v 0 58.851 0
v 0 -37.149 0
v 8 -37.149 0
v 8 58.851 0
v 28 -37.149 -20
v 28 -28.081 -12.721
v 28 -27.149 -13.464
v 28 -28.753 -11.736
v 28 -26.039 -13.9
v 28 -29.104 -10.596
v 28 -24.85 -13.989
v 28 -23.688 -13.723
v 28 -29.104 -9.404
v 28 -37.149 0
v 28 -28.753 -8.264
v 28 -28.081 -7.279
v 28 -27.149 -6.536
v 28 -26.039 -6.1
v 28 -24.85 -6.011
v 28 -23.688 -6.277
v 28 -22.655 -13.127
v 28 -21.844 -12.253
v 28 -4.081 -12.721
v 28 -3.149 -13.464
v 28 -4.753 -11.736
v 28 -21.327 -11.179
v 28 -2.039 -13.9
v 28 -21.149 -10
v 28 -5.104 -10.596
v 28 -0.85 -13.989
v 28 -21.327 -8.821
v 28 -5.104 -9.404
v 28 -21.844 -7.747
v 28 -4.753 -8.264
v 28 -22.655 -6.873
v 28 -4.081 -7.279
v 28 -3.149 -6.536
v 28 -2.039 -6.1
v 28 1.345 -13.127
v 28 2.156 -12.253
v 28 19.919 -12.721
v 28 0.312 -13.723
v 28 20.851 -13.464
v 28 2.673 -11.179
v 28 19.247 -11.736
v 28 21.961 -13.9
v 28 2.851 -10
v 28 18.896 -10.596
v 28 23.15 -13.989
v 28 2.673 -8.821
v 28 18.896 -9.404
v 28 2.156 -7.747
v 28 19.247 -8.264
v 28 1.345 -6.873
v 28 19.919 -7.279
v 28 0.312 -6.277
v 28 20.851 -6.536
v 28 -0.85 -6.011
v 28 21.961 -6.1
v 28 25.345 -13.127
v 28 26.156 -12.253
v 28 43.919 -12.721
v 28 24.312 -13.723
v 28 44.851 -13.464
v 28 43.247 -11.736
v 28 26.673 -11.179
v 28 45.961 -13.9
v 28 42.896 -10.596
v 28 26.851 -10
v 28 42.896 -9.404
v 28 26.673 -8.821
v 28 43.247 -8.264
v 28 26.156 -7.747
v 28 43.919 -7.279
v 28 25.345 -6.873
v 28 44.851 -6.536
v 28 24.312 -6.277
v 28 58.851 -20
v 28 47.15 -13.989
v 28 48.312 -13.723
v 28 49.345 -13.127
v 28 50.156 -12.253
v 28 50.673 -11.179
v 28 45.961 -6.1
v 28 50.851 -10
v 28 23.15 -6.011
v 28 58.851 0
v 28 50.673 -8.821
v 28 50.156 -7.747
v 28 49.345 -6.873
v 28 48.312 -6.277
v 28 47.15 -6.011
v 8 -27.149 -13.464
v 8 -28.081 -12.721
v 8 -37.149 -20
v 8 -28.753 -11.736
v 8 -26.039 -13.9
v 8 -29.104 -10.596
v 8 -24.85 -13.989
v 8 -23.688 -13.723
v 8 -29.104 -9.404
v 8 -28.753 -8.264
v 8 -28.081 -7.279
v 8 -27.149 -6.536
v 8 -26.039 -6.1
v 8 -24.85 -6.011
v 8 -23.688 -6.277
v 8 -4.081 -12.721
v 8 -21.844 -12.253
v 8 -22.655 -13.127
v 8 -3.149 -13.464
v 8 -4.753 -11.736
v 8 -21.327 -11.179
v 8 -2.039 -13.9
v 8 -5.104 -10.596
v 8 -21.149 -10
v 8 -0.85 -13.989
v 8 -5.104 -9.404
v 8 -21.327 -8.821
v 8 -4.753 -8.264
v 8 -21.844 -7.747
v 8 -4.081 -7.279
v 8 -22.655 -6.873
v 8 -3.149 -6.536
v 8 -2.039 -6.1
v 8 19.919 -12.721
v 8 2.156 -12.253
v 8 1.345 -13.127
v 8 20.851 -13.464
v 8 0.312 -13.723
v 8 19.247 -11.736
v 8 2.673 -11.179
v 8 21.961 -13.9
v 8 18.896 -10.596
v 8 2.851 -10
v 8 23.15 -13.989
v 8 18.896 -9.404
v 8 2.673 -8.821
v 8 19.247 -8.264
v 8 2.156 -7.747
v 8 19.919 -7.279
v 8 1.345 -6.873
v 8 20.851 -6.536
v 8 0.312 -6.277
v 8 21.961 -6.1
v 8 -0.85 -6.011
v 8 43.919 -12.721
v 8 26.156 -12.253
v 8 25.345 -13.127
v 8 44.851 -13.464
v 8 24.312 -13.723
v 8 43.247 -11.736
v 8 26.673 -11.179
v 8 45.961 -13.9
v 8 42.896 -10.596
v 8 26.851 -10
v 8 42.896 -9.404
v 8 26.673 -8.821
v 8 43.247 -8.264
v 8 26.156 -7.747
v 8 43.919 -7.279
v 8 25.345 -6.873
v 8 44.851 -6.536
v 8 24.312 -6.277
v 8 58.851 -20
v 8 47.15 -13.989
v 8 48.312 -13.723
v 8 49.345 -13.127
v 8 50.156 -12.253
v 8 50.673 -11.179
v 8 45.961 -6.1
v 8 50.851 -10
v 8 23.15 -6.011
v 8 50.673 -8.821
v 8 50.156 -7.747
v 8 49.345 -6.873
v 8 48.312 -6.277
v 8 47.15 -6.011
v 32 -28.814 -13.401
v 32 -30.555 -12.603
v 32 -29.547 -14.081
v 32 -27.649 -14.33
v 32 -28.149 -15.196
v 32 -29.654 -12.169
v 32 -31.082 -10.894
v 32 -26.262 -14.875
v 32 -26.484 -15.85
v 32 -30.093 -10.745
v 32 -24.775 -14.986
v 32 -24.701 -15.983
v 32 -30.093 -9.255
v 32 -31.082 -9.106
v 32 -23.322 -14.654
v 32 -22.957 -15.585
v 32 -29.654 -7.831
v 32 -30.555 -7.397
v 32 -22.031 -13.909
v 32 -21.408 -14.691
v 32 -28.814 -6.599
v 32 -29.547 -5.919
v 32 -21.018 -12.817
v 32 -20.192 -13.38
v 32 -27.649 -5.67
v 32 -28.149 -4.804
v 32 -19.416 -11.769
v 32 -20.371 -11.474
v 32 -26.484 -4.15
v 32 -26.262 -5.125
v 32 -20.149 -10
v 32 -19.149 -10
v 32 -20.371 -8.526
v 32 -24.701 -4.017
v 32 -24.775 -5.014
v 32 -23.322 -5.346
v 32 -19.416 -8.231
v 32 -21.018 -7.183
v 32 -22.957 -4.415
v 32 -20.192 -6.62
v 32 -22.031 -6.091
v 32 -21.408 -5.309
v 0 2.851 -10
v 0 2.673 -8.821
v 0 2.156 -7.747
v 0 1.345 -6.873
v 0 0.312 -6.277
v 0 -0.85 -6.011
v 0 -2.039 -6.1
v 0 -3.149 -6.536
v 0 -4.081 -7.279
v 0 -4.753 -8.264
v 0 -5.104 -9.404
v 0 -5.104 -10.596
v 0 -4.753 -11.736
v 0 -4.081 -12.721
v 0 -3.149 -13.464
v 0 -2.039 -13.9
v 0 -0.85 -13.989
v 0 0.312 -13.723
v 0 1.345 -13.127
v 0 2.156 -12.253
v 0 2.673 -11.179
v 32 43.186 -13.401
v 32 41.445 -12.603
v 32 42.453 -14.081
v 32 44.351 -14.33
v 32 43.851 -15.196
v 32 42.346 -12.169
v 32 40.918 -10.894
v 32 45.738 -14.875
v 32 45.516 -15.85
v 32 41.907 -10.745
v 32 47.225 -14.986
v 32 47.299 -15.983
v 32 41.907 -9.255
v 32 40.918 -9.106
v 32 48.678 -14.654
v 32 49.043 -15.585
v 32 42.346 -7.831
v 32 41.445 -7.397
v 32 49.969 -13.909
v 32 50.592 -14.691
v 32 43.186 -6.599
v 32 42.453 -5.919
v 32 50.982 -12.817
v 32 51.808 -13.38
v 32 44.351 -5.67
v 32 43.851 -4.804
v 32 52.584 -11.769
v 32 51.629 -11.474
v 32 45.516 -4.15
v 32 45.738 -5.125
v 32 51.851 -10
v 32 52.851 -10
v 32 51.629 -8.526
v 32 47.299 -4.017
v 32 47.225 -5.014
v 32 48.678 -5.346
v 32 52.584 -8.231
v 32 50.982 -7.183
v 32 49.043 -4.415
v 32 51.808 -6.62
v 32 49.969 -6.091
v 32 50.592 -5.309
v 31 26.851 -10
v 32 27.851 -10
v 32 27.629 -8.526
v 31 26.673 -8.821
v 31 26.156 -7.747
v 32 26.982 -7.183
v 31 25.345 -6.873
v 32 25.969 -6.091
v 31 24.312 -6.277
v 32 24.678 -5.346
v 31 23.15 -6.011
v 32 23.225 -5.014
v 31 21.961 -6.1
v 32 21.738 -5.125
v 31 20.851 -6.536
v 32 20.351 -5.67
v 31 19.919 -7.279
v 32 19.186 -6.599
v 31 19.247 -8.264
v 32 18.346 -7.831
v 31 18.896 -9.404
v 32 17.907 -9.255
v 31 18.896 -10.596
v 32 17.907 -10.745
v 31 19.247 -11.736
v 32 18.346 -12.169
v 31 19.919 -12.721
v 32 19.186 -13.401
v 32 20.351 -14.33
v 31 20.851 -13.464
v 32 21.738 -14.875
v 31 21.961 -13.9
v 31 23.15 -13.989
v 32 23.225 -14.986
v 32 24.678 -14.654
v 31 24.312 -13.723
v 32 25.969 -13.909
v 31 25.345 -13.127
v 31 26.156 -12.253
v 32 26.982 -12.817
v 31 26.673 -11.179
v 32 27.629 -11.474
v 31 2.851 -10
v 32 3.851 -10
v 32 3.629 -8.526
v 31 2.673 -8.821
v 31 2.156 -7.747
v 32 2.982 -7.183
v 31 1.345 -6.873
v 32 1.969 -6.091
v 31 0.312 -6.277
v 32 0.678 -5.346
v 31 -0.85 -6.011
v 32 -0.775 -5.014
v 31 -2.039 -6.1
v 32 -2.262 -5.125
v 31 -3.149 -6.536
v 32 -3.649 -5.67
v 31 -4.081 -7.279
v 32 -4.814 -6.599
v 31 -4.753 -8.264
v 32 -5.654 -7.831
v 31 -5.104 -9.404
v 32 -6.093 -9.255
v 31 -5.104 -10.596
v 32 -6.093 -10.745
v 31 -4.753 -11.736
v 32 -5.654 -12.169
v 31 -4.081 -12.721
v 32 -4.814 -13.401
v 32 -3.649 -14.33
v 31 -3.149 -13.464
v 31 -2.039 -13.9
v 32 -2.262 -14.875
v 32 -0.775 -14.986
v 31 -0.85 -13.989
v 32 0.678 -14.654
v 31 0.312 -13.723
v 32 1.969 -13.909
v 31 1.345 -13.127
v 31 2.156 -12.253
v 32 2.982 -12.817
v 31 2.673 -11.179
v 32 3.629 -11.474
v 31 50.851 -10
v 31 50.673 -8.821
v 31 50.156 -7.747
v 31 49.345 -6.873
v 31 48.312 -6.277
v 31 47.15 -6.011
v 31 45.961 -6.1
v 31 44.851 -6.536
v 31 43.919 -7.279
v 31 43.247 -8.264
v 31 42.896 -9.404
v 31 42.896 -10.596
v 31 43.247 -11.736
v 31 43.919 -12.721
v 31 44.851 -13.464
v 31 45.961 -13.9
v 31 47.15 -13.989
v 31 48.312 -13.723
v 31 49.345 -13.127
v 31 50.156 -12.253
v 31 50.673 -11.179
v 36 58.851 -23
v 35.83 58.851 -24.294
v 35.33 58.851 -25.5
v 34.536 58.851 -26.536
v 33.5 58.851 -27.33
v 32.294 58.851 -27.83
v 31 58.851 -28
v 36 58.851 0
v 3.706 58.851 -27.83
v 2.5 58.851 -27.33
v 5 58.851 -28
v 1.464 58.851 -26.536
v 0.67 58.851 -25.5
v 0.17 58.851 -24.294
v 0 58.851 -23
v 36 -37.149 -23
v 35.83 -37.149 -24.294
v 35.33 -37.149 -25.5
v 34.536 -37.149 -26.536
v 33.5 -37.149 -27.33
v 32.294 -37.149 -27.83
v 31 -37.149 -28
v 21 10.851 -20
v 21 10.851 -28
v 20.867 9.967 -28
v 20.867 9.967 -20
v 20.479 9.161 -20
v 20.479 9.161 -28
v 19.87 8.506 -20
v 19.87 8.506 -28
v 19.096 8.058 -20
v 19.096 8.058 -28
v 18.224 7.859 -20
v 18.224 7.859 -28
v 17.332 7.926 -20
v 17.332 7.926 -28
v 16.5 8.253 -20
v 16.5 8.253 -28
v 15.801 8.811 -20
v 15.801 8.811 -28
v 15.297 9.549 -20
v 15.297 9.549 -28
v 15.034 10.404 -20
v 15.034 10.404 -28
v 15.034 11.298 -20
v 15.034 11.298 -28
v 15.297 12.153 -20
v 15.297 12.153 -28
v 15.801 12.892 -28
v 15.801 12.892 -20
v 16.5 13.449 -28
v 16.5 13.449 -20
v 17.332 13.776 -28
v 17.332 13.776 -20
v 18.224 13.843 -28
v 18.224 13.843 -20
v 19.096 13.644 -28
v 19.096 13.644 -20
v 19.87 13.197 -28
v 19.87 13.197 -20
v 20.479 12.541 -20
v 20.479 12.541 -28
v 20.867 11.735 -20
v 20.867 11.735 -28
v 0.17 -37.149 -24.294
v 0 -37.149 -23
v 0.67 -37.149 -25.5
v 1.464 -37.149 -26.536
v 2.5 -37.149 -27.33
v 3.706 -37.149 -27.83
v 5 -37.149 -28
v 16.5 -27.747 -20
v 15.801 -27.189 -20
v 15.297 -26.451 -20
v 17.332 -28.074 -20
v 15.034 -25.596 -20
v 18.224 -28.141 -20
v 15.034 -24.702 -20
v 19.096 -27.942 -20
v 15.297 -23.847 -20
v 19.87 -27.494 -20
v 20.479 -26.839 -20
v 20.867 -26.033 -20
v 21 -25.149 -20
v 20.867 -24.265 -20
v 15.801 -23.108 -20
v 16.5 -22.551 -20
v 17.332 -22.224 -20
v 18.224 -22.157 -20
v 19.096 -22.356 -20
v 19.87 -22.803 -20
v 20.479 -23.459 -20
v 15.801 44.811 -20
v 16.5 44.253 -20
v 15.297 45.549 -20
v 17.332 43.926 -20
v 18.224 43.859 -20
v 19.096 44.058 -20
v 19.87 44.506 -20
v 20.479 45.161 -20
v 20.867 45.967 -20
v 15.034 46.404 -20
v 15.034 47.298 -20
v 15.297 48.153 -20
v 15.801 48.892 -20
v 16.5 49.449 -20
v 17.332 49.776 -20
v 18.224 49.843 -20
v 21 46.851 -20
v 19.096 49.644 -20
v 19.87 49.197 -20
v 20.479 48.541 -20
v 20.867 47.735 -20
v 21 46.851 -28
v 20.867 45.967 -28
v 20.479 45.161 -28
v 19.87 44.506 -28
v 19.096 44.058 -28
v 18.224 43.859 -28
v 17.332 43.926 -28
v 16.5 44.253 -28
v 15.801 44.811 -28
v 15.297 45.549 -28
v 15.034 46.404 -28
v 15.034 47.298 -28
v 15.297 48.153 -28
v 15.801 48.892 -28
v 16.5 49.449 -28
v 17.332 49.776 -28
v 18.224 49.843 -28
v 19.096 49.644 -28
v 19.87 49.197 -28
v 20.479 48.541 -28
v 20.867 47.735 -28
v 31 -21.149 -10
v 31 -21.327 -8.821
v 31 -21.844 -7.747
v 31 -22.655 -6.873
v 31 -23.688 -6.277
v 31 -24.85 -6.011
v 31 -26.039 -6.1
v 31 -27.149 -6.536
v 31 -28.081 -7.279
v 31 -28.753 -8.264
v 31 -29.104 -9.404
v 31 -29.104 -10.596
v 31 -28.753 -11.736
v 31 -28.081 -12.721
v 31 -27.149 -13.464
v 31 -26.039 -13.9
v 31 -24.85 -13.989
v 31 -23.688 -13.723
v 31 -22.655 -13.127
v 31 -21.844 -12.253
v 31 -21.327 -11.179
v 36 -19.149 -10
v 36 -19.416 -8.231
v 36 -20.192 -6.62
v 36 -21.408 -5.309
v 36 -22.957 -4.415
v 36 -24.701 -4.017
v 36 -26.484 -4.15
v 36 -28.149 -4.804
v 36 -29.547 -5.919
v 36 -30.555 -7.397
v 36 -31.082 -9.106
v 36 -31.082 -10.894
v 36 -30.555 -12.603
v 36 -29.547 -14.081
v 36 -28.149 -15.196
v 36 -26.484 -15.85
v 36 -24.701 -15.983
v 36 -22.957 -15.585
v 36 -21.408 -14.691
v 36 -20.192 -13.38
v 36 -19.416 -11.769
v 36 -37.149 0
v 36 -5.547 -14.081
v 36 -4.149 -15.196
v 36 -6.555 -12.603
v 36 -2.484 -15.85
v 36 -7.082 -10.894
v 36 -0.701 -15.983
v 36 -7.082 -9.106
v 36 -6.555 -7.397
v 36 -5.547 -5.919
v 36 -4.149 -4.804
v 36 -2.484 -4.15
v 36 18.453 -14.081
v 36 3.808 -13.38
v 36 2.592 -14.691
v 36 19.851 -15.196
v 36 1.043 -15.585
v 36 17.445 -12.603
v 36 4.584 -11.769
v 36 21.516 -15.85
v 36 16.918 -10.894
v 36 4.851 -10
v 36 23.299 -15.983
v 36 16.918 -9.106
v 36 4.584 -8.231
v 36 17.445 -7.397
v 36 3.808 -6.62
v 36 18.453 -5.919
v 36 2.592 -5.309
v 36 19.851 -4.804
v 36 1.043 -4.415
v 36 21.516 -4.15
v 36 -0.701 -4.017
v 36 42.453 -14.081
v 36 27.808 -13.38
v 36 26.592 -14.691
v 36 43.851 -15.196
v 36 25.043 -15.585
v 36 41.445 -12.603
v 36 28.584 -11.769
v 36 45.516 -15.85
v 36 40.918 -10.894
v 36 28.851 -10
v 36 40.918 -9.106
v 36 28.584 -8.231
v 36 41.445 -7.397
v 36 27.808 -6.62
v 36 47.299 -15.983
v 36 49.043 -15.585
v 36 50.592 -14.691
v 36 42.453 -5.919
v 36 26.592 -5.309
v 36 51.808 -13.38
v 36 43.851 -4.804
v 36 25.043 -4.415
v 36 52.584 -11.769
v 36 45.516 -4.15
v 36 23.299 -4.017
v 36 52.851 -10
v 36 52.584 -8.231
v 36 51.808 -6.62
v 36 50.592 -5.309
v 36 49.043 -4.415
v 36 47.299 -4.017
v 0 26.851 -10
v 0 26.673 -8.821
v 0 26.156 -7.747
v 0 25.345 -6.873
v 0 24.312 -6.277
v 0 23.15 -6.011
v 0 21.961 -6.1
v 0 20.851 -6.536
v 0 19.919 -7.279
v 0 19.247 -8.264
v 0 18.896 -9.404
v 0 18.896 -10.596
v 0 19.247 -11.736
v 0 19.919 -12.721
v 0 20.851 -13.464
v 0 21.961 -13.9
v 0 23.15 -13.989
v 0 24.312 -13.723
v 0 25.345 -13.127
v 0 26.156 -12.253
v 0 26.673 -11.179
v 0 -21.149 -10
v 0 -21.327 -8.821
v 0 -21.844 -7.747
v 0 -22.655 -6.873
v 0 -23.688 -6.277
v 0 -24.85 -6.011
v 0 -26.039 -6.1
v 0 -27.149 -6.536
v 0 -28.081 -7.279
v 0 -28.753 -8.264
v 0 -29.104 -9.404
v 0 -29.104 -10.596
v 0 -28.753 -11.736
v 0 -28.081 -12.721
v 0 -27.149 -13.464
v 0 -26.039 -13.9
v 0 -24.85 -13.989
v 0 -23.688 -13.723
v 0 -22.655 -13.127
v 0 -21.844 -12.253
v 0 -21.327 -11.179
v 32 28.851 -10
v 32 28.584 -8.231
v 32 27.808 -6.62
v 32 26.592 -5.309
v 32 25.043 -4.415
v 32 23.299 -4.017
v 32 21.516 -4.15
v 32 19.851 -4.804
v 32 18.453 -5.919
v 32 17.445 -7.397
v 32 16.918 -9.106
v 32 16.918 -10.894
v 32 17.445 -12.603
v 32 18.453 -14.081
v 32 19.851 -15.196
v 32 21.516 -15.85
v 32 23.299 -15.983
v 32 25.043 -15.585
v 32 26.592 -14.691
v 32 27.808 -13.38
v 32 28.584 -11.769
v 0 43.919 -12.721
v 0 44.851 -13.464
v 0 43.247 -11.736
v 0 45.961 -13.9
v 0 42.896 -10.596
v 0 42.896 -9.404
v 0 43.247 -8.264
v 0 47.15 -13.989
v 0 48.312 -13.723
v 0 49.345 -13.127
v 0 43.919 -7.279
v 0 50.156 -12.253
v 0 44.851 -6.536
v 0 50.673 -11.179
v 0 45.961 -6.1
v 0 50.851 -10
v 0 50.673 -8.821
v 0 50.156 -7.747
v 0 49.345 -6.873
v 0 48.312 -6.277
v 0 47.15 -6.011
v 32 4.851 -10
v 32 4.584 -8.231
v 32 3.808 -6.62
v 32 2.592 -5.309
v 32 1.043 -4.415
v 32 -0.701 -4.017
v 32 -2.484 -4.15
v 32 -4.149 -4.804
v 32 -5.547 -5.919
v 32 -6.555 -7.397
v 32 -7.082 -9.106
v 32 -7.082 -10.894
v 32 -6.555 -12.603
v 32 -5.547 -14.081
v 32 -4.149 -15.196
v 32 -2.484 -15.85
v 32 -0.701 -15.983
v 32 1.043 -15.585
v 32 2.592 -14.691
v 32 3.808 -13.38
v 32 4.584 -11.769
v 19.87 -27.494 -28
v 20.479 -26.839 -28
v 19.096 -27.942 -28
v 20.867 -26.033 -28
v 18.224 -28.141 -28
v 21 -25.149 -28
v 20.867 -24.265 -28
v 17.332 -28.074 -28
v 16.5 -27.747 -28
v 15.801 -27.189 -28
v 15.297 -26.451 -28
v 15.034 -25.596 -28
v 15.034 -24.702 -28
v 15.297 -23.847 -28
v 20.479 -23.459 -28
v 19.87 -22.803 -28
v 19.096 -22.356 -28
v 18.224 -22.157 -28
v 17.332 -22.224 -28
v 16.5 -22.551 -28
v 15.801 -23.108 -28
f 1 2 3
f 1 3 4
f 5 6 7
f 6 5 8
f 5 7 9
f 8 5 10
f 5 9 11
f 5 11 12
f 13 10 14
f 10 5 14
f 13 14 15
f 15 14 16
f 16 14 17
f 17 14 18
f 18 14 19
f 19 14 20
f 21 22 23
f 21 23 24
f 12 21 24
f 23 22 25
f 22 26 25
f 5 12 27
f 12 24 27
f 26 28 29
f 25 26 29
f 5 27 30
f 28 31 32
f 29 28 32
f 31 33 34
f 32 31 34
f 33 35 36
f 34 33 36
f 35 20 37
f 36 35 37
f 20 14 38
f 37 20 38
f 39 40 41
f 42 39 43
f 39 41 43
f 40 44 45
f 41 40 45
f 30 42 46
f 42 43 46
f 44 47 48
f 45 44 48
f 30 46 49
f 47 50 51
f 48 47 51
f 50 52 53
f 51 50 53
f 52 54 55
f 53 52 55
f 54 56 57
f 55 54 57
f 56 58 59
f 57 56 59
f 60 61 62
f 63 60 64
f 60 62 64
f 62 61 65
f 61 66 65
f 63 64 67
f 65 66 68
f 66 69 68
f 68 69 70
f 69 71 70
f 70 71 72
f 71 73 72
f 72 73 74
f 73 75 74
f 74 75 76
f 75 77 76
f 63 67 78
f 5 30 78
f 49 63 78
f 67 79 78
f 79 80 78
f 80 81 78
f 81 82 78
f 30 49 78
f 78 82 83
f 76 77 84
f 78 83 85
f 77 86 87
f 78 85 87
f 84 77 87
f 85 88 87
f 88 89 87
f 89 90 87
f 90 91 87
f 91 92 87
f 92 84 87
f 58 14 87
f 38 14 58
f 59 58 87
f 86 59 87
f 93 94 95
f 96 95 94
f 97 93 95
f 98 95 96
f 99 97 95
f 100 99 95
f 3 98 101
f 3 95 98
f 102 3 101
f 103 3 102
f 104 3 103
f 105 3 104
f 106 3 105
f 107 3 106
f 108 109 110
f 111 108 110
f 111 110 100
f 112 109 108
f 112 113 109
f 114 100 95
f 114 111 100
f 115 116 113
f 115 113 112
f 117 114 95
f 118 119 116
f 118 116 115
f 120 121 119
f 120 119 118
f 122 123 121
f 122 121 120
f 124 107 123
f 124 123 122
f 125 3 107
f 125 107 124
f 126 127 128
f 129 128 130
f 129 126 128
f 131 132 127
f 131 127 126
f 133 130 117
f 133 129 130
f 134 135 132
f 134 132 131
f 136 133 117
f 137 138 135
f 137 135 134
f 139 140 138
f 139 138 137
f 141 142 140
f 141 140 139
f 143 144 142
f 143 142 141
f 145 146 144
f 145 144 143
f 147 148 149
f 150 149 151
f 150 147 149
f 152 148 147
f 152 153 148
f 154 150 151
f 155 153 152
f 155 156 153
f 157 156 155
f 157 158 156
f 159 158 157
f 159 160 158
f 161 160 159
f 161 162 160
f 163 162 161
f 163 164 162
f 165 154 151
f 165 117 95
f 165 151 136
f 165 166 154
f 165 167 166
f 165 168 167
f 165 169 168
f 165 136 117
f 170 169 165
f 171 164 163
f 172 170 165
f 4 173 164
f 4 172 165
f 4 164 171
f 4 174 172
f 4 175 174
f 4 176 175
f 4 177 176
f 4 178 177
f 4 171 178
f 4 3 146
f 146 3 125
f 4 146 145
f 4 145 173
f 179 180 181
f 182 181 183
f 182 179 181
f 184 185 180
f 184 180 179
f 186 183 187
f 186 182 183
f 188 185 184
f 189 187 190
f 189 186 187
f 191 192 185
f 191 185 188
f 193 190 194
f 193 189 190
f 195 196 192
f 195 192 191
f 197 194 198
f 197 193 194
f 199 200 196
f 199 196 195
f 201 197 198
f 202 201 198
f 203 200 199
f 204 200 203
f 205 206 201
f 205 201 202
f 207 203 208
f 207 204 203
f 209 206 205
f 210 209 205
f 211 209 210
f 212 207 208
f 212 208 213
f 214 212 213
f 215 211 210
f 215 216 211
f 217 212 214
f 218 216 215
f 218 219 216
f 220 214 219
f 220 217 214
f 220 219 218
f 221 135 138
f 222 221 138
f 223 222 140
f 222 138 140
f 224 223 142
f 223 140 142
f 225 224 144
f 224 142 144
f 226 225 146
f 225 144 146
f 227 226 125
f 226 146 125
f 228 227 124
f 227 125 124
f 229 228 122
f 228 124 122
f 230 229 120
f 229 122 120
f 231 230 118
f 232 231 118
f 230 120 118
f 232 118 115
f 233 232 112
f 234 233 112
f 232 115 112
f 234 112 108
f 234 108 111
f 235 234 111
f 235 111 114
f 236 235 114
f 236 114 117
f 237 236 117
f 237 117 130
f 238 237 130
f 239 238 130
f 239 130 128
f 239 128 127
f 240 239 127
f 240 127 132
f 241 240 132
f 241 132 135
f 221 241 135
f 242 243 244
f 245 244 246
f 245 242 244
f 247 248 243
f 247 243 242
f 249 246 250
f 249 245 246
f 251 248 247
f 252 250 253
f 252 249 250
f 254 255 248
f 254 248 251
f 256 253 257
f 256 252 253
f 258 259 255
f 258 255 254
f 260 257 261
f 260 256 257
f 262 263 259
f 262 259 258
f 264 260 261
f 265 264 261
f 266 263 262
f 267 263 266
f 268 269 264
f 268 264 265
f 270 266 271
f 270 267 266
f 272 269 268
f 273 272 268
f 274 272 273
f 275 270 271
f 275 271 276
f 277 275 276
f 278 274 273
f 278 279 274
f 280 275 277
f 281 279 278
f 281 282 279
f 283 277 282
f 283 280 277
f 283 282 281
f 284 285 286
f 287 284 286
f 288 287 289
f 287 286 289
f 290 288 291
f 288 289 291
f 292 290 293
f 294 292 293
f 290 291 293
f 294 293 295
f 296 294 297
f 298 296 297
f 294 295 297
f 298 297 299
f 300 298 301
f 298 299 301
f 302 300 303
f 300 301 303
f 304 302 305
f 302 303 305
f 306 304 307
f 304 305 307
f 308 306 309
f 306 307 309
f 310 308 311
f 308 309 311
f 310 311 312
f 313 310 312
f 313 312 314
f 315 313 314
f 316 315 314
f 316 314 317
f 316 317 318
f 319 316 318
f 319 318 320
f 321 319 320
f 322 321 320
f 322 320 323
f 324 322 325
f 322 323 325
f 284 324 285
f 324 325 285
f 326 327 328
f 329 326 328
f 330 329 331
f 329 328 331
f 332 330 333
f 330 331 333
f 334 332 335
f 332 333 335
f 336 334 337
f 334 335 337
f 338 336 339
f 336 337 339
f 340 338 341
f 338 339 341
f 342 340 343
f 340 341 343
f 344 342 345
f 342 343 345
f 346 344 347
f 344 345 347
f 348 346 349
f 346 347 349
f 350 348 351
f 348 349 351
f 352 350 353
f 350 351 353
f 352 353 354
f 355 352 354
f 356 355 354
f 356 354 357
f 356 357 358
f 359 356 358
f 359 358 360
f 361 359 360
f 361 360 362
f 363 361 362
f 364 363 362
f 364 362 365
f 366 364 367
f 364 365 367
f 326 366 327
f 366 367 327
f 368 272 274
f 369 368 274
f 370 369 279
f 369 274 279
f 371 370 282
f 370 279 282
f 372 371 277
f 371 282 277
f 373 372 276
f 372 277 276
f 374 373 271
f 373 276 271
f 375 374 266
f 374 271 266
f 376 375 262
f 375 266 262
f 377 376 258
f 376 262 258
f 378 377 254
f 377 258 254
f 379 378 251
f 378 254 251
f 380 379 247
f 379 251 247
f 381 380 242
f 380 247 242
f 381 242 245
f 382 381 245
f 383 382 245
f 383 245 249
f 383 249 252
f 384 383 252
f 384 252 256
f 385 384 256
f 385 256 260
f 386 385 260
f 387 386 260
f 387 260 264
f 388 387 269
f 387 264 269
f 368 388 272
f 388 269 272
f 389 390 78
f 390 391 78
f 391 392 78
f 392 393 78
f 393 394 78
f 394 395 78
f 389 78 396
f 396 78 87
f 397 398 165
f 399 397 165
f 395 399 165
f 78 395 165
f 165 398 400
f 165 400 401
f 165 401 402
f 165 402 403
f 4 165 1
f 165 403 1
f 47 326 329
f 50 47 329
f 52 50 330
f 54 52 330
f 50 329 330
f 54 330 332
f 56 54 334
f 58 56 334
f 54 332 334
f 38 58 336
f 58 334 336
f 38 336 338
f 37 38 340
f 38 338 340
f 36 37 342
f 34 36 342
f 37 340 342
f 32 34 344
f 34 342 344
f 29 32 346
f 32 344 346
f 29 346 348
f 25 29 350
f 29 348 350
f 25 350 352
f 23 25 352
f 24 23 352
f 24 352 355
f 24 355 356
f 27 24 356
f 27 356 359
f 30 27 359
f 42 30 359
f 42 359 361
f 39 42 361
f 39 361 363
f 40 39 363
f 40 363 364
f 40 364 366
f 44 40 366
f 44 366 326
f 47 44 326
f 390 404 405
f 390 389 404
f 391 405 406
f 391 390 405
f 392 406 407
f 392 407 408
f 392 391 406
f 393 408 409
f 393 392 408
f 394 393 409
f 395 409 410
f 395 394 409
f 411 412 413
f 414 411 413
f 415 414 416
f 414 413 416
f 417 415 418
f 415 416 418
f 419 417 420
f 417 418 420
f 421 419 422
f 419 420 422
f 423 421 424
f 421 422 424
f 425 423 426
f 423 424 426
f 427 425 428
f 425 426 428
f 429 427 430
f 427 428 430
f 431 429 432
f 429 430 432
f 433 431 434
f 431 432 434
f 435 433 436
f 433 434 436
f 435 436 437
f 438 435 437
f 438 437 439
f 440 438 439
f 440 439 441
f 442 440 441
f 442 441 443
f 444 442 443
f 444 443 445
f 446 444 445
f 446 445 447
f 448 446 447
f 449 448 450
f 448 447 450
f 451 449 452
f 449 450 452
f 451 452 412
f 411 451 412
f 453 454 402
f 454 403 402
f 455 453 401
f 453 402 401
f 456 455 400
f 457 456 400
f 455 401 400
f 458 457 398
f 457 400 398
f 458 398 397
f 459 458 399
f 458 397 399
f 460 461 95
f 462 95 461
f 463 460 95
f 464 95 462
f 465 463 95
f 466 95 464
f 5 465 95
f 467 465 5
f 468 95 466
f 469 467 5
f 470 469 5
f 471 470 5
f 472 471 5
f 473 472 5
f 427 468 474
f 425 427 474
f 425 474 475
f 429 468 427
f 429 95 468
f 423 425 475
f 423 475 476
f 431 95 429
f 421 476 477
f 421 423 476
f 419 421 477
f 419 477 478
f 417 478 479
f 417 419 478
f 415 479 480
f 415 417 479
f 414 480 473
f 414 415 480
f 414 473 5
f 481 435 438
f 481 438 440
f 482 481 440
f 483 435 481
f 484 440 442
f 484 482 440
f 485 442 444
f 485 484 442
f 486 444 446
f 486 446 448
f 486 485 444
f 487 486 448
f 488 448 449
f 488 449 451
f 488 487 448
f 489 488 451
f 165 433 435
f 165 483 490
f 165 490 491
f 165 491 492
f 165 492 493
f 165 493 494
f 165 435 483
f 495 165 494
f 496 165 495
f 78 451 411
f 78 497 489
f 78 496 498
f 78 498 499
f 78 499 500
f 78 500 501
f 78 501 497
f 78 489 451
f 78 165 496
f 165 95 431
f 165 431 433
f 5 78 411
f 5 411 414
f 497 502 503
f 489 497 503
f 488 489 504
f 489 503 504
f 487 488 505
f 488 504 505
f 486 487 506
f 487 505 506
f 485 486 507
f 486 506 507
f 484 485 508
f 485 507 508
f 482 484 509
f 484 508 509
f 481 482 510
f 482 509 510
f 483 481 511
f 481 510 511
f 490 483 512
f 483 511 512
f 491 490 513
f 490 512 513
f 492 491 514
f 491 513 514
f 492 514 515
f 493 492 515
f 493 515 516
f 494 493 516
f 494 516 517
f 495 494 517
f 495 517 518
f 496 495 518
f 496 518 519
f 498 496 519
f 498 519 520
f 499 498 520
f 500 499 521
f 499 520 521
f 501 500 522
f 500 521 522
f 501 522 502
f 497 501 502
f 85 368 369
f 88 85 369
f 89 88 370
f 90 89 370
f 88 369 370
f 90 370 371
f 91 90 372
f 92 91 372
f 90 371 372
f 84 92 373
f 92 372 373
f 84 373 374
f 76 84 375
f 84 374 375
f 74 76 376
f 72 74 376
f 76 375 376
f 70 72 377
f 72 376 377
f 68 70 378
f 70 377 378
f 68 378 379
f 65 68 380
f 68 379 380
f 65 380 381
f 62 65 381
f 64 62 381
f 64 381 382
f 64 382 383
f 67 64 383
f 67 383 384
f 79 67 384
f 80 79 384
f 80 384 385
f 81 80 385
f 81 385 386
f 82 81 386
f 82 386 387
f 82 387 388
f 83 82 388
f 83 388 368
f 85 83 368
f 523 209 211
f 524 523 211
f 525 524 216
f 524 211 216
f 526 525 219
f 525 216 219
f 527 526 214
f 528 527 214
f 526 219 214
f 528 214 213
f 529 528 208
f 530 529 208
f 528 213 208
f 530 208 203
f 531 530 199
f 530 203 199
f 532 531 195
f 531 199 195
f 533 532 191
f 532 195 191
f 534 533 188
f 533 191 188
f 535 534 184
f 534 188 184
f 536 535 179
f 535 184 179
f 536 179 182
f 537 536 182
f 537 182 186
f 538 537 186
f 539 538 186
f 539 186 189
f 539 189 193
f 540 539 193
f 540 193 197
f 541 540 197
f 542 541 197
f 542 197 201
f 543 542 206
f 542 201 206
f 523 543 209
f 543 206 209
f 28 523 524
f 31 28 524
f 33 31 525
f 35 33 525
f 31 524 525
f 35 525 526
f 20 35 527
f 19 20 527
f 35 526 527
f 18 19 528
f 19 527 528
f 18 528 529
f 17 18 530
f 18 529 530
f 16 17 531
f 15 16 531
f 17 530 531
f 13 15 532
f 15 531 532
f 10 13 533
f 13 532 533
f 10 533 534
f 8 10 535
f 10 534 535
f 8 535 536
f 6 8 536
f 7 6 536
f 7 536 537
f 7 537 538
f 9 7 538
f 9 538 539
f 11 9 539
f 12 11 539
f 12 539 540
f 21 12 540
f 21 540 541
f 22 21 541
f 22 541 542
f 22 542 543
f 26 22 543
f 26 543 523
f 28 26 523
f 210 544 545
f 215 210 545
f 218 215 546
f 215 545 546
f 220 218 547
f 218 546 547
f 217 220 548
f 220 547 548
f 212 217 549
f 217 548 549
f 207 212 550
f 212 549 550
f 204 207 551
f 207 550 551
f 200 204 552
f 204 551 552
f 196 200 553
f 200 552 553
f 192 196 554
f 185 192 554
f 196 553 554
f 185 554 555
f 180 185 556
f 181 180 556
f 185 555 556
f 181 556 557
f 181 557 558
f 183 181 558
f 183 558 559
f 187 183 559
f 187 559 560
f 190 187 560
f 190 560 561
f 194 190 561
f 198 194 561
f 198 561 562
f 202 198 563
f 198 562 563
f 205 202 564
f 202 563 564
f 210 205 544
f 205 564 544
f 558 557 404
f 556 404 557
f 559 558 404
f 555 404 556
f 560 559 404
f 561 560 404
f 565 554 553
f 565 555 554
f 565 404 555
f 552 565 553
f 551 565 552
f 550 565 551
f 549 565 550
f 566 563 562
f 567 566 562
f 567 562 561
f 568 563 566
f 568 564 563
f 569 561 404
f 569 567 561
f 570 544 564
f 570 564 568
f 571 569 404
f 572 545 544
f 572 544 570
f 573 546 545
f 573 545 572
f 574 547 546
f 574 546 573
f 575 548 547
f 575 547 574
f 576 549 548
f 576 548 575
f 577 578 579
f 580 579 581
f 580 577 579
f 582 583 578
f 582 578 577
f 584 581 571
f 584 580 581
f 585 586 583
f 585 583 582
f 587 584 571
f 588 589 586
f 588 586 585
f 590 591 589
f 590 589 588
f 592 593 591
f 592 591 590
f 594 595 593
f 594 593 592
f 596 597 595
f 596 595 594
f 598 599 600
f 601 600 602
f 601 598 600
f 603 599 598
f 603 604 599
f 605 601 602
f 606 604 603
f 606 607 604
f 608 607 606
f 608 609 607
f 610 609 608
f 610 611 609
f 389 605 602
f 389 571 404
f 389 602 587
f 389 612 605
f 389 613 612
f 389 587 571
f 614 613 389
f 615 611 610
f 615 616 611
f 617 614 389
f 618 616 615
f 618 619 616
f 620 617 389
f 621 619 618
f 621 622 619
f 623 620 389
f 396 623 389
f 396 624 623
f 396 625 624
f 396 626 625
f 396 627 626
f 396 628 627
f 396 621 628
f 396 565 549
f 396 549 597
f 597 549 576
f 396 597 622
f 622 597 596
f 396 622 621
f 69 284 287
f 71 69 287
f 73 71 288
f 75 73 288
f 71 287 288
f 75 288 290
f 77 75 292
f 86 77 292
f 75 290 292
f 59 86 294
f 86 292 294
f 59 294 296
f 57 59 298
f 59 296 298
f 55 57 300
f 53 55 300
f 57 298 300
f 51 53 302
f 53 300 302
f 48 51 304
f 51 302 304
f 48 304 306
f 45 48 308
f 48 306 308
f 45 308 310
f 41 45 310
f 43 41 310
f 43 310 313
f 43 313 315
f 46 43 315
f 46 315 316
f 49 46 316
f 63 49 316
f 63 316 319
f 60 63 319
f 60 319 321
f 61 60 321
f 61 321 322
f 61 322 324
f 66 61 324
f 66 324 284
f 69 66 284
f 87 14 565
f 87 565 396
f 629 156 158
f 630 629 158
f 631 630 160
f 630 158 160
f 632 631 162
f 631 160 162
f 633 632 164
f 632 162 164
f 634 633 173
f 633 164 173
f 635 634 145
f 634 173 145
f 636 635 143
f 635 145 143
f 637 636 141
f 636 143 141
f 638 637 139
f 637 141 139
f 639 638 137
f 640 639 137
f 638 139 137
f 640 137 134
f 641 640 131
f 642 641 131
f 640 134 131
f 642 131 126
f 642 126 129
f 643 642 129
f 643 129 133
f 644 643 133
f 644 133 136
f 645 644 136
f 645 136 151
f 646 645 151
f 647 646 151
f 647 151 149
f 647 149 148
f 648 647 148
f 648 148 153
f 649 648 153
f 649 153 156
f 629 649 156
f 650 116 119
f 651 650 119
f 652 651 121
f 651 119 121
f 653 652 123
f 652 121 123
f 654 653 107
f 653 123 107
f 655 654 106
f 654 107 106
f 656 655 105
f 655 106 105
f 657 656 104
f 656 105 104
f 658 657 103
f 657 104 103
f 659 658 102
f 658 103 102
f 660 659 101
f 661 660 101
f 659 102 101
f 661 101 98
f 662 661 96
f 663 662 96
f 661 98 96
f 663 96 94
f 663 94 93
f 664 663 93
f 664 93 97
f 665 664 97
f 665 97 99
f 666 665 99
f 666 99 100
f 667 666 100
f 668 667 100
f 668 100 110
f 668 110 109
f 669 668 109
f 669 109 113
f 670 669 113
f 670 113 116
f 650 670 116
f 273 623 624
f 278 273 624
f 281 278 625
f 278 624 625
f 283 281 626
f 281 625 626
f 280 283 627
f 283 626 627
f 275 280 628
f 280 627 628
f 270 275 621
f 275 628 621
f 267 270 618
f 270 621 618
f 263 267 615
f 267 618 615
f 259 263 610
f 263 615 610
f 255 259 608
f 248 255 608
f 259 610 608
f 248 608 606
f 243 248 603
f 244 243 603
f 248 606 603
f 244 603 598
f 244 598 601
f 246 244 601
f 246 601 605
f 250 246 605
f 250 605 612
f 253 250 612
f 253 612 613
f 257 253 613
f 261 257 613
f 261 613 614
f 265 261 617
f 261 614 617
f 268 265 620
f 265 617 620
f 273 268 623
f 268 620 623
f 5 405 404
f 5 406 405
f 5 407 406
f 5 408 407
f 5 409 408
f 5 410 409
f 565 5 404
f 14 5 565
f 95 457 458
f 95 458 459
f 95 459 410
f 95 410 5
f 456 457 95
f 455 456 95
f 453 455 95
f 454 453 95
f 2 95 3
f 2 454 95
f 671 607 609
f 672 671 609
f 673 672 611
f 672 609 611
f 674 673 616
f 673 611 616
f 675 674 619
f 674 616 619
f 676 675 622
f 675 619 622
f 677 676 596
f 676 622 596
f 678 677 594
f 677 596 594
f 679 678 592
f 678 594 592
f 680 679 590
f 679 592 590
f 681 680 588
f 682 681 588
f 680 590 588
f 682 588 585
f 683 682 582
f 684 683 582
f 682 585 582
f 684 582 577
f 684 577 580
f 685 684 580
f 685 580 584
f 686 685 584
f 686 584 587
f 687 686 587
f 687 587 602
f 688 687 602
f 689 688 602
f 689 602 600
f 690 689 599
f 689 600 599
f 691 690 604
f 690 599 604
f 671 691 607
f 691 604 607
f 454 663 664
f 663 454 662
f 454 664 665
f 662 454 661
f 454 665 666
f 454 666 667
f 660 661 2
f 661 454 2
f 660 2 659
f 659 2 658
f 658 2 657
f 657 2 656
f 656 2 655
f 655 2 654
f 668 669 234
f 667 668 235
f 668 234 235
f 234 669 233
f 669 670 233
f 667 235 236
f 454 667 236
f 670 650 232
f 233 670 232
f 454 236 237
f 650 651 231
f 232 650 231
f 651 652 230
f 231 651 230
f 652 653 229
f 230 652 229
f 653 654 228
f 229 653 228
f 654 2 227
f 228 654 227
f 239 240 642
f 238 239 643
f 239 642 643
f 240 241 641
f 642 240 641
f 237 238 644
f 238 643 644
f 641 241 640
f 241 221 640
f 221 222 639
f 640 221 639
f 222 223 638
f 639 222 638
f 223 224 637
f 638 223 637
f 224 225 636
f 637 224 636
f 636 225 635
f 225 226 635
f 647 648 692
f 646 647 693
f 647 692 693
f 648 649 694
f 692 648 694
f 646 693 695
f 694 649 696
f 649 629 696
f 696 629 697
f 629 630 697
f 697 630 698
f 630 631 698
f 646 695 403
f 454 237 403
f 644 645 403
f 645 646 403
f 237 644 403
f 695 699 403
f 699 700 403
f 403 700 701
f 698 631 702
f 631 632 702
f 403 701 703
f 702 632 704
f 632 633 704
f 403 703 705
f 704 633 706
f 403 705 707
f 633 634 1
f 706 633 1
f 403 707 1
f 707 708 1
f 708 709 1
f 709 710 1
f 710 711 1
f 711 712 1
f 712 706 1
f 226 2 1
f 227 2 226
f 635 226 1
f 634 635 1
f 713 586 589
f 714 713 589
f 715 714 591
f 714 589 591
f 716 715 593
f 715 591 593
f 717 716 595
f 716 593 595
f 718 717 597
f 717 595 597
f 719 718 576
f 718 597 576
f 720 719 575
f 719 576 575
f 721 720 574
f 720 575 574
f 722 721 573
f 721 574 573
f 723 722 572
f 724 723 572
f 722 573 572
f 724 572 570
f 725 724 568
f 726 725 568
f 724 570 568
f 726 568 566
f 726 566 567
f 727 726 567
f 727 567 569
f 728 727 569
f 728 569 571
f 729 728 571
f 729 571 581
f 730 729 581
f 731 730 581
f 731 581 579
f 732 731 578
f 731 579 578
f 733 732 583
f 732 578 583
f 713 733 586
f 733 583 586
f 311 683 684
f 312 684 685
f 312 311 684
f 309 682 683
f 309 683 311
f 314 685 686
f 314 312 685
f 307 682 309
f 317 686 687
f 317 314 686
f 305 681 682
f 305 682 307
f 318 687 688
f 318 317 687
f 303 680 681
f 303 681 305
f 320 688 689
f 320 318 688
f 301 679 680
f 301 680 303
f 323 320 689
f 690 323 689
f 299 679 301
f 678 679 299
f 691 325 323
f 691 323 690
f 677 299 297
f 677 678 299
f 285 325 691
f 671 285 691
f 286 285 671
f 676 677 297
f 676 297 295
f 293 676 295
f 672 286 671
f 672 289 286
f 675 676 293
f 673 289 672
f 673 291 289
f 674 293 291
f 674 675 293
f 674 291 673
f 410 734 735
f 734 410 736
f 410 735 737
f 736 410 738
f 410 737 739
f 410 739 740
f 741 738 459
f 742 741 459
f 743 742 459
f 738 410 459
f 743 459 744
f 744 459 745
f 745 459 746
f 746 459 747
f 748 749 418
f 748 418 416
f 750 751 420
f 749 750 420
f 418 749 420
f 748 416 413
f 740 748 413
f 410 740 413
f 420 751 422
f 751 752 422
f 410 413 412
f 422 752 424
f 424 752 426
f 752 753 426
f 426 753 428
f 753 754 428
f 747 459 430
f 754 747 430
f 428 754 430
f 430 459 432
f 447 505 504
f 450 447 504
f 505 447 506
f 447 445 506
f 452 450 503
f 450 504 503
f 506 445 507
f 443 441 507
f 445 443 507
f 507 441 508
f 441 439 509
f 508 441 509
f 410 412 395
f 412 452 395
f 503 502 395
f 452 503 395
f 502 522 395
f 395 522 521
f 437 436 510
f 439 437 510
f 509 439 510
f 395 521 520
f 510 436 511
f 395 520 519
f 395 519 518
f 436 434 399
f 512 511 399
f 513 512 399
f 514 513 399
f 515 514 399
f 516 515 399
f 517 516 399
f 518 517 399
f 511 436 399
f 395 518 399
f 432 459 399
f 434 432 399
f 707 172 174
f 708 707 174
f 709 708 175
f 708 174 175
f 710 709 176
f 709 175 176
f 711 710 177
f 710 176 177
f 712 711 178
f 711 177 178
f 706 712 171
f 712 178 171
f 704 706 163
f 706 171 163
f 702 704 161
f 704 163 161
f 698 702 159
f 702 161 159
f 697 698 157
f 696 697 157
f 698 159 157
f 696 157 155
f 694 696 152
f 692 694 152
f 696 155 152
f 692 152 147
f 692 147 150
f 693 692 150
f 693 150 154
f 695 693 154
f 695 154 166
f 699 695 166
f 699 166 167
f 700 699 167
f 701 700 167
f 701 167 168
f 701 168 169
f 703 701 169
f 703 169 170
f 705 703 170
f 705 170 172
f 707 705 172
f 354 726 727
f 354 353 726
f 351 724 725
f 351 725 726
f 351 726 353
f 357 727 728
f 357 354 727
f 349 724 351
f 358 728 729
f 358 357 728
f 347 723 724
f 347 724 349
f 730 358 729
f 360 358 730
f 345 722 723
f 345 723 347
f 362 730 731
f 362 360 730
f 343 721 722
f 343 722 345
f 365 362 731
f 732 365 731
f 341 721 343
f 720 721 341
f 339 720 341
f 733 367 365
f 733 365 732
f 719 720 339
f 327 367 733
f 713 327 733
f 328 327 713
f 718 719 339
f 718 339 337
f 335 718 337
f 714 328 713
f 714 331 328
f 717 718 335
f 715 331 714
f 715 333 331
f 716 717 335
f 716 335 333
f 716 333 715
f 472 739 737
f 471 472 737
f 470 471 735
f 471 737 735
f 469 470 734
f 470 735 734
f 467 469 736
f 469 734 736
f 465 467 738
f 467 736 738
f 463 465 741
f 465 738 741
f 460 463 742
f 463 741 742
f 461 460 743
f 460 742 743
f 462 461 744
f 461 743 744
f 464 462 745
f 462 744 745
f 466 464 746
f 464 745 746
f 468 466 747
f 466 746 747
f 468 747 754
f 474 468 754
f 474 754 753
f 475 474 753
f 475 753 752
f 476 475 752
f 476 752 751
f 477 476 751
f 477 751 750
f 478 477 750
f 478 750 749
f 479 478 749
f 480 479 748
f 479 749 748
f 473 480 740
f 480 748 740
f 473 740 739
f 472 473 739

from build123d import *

# Parameters (mm, degrees)
F0_W      = 96
F0_H      = 28
F1_DEPTH  = 36
F2_W      = 20
F2_H      = 96
F3_DEPTH  = 20
F4_R      = 5
F5_R      = 4
F6_DEPTH  = 36
F7_R      = 6
F8_DEPTH  = 4
F9_SIZE   = 1
F10_R     = 3
F11_DEPTH = 8


with BuildPart() as f1:
    # F0 (on Right) → F1 (new body)
    with BuildSketch(Plane.YZ):
        with Locations((10.8510512412, -14)):
            Rectangle(F0_W, F0_H)
    extrude(amount=F1_DEPTH)

    # F2 (on face) → F3 (cut)
    with BuildSketch(Plane.XY):
        with Locations((18, 10.8510512412)):
            Rectangle(F2_W, F2_H)
    extrude(amount=-F3_DEPTH, mode=Mode.SUBTRACT)

    # F4
    f4_edges = [f1.edges().sort_by_distance(p)[0] for p in [
        (36, 10.851051, -28),
        (0, 10.851051, -28),
    ]]
    fillet(f4_edges, radius=F4_R)

    # F5 (on face) → F6 (cut)
    with BuildSketch(Plane.YZ.offset(36)):
        with Locations((46.8510512412, -10)):
            Circle(F5_R)
        with Locations((22.8510512412, -10)):
            Circle(F5_R)
        with Locations((-1.1489487588, -10)):
            Circle(F5_R)
        with Locations((-25.1489487588, -10)):
            Circle(F5_R)
    extrude(amount=-F6_DEPTH, mode=Mode.SUBTRACT)

    # F7 (on face) → F8 (cut)
    with BuildSketch(Plane.YZ.offset(36)):
        with Locations((-25.1489487588, -10)):
            Circle(F7_R)
        with Locations((-1.1489487588, -10)):
            Circle(F7_R)
        with Locations((22.8510512412, -10)):
            Circle(F7_R)
        with Locations((46.8510512412, -10)):
            Circle(F7_R)
    extrude(amount=-F8_DEPTH, mode=Mode.SUBTRACT)

    # F9
    f9_edges = [f1.edges().sort_by_distance(p)[0] for p in [
        (32, -29.148949, -10),
        (32, -5.148949, -10),
        (32, 18.851051, -10),
        (32, 42.851051, -10),
    ]]
    chamfer(f9_edges, length=F9_SIZE)

    # F10 (on face) → F11 (cut)
    with BuildSketch(Plane(origin=(0, 0, -28), x_dir=(1, 0, 0), z_dir=(0, 0, -1))):
        with Locations((18, -46.8510512412)):
            Circle(F10_R)
        with Locations((18, -10.8510512412)):
            Circle(F10_R)
        with Locations((18, 25.1489487588)):
            Circle(F10_R)
    extrude(amount=-F11_DEPTH, mode=Mode.SUBTRACT)


solid = f1.part
